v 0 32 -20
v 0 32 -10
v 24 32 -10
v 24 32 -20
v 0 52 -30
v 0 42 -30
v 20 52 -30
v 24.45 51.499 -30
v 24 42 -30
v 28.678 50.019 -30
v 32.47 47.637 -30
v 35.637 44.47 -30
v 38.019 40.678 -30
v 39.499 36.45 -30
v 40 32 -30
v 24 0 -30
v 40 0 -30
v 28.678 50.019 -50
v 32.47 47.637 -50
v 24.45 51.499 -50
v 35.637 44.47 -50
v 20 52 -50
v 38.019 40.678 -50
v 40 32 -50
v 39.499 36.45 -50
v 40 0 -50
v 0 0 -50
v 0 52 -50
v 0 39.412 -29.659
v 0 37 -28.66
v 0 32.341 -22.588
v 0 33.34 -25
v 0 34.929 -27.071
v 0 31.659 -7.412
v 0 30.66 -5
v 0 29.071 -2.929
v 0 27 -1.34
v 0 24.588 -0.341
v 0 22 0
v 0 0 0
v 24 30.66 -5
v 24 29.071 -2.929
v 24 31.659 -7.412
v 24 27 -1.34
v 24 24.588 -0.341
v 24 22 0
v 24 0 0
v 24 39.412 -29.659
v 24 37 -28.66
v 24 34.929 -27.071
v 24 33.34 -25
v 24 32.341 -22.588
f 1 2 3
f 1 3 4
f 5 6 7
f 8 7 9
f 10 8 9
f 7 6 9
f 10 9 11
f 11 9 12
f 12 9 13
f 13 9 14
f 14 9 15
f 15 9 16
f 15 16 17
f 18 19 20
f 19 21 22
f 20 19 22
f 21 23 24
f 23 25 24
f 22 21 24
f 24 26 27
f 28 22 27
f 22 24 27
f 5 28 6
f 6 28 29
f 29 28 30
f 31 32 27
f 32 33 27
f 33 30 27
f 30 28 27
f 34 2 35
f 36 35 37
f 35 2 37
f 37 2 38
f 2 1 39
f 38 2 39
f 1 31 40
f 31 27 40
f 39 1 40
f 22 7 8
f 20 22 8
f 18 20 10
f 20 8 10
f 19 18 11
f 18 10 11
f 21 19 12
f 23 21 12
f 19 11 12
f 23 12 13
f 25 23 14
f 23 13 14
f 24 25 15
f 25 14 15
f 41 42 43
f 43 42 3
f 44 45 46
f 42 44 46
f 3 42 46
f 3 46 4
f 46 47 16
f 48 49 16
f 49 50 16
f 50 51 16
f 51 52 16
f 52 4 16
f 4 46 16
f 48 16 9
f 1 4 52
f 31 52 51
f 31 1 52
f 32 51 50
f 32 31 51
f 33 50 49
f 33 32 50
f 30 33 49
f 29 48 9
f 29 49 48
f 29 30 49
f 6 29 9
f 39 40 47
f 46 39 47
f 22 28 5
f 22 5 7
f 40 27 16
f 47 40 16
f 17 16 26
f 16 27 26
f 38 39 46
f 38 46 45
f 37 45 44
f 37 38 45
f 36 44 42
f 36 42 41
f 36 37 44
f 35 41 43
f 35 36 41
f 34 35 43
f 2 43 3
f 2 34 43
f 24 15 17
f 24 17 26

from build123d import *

# Parameters (mm, degrees)
SKETCH1_W               = 24
SKETCH1_H               = 30
BOSS_EXTRUDE1_DEPTH     = 60
CUT_EXTRUDE1_DEPTH      = 25
CUT_EXTRUDE1_DEPTH_BACK = 1
BOSS_EXTRUDE2_DEPTH     = 52
CUT_EXTRUDE3_DEPTH      = 31
CUT_EXTRUDE3_DEPTH_BACK = 20


with BuildPart() as part:
    # Sketch1 → Boss-Extrude1 (new body)
    with BuildSketch(Plane(origin=(0, 0, 0), x_dir=(1, 0, 0), z_dir=(0, 1, 0))):
        with Locations((12, 15)):
            Rectangle(SKETCH1_W, SKETCH1_H)
    extrude(amount=BOSS_EXTRUDE1_DEPTH)

    # Sketch2 → Cut-Extrude1 (cut, two sides)
    with BuildSketch(Plane(origin=(0, 0, 0), x_dir=(0, 0, -1), z_dir=(1, 0, 0))) as cut_extrude1_sk:
        with BuildLine():
            Line((0, 60), (0, 22))
            ThreePointArc((0, 22), (2.928932188, 29.071067812), (10, 32))
            Line((10, 32), (20, 32))
            ThreePointArc((20, 32), (27.071067812, 34.928932188), (30, 42))
            Line((30, 42), (30, 60))
            Line((30, 60), (0, 60))
        make_face()
    extrude(amount=CUT_EXTRUDE1_DEPTH, mode=Mode.SUBTRACT)
    extrude(cut_extrude1_sk.sketch, amount=-CUT_EXTRUDE1_DEPTH_BACK, mode=Mode.SUBTRACT)

    # Sketch1<5> → Boss-Extrude2 (add)
    with BuildSketch(Plane(origin=(0, 0, 0), x_dir=(1, 0, 0), z_dir=(0, 1, 0))):
        Polygon((0, 50), (0, 30), (24, 30), (40, 30), (40, 50), align=None)
    extrude(amount=BOSS_EXTRUDE2_DEPTH)

    # Sketch5 → Cut-Extrude3 (cut, two sides)
    with BuildSketch(Plane.XY.offset(-30)) as cut_extrude3_sk:
        with BuildLine():
            Line((-101.427106217, 52), (20, 52))
            ThreePointArc((20, 52), (34.142135624, 46.142135624), (40, 32))
            Line((40, 32), (40, -89.427106217))
            Line((40, -89.427106217), (211.723860452, 82.296754235))
            Line((211.723860452, 82.296754235), (70.296754235, 223.723860452))
            Line((70.296754235, 223.723860452), (-101.427106217, 52))
        make_face()
    extrude(amount=CUT_EXTRUDE3_DEPTH, mode=Mode.SUBTRACT)
    extrude(cut_extrude3_sk.sketch, amount=-CUT_EXTRUDE3_DEPTH_BACK, mode=Mode.SUBTRACT)


solid = part.part
